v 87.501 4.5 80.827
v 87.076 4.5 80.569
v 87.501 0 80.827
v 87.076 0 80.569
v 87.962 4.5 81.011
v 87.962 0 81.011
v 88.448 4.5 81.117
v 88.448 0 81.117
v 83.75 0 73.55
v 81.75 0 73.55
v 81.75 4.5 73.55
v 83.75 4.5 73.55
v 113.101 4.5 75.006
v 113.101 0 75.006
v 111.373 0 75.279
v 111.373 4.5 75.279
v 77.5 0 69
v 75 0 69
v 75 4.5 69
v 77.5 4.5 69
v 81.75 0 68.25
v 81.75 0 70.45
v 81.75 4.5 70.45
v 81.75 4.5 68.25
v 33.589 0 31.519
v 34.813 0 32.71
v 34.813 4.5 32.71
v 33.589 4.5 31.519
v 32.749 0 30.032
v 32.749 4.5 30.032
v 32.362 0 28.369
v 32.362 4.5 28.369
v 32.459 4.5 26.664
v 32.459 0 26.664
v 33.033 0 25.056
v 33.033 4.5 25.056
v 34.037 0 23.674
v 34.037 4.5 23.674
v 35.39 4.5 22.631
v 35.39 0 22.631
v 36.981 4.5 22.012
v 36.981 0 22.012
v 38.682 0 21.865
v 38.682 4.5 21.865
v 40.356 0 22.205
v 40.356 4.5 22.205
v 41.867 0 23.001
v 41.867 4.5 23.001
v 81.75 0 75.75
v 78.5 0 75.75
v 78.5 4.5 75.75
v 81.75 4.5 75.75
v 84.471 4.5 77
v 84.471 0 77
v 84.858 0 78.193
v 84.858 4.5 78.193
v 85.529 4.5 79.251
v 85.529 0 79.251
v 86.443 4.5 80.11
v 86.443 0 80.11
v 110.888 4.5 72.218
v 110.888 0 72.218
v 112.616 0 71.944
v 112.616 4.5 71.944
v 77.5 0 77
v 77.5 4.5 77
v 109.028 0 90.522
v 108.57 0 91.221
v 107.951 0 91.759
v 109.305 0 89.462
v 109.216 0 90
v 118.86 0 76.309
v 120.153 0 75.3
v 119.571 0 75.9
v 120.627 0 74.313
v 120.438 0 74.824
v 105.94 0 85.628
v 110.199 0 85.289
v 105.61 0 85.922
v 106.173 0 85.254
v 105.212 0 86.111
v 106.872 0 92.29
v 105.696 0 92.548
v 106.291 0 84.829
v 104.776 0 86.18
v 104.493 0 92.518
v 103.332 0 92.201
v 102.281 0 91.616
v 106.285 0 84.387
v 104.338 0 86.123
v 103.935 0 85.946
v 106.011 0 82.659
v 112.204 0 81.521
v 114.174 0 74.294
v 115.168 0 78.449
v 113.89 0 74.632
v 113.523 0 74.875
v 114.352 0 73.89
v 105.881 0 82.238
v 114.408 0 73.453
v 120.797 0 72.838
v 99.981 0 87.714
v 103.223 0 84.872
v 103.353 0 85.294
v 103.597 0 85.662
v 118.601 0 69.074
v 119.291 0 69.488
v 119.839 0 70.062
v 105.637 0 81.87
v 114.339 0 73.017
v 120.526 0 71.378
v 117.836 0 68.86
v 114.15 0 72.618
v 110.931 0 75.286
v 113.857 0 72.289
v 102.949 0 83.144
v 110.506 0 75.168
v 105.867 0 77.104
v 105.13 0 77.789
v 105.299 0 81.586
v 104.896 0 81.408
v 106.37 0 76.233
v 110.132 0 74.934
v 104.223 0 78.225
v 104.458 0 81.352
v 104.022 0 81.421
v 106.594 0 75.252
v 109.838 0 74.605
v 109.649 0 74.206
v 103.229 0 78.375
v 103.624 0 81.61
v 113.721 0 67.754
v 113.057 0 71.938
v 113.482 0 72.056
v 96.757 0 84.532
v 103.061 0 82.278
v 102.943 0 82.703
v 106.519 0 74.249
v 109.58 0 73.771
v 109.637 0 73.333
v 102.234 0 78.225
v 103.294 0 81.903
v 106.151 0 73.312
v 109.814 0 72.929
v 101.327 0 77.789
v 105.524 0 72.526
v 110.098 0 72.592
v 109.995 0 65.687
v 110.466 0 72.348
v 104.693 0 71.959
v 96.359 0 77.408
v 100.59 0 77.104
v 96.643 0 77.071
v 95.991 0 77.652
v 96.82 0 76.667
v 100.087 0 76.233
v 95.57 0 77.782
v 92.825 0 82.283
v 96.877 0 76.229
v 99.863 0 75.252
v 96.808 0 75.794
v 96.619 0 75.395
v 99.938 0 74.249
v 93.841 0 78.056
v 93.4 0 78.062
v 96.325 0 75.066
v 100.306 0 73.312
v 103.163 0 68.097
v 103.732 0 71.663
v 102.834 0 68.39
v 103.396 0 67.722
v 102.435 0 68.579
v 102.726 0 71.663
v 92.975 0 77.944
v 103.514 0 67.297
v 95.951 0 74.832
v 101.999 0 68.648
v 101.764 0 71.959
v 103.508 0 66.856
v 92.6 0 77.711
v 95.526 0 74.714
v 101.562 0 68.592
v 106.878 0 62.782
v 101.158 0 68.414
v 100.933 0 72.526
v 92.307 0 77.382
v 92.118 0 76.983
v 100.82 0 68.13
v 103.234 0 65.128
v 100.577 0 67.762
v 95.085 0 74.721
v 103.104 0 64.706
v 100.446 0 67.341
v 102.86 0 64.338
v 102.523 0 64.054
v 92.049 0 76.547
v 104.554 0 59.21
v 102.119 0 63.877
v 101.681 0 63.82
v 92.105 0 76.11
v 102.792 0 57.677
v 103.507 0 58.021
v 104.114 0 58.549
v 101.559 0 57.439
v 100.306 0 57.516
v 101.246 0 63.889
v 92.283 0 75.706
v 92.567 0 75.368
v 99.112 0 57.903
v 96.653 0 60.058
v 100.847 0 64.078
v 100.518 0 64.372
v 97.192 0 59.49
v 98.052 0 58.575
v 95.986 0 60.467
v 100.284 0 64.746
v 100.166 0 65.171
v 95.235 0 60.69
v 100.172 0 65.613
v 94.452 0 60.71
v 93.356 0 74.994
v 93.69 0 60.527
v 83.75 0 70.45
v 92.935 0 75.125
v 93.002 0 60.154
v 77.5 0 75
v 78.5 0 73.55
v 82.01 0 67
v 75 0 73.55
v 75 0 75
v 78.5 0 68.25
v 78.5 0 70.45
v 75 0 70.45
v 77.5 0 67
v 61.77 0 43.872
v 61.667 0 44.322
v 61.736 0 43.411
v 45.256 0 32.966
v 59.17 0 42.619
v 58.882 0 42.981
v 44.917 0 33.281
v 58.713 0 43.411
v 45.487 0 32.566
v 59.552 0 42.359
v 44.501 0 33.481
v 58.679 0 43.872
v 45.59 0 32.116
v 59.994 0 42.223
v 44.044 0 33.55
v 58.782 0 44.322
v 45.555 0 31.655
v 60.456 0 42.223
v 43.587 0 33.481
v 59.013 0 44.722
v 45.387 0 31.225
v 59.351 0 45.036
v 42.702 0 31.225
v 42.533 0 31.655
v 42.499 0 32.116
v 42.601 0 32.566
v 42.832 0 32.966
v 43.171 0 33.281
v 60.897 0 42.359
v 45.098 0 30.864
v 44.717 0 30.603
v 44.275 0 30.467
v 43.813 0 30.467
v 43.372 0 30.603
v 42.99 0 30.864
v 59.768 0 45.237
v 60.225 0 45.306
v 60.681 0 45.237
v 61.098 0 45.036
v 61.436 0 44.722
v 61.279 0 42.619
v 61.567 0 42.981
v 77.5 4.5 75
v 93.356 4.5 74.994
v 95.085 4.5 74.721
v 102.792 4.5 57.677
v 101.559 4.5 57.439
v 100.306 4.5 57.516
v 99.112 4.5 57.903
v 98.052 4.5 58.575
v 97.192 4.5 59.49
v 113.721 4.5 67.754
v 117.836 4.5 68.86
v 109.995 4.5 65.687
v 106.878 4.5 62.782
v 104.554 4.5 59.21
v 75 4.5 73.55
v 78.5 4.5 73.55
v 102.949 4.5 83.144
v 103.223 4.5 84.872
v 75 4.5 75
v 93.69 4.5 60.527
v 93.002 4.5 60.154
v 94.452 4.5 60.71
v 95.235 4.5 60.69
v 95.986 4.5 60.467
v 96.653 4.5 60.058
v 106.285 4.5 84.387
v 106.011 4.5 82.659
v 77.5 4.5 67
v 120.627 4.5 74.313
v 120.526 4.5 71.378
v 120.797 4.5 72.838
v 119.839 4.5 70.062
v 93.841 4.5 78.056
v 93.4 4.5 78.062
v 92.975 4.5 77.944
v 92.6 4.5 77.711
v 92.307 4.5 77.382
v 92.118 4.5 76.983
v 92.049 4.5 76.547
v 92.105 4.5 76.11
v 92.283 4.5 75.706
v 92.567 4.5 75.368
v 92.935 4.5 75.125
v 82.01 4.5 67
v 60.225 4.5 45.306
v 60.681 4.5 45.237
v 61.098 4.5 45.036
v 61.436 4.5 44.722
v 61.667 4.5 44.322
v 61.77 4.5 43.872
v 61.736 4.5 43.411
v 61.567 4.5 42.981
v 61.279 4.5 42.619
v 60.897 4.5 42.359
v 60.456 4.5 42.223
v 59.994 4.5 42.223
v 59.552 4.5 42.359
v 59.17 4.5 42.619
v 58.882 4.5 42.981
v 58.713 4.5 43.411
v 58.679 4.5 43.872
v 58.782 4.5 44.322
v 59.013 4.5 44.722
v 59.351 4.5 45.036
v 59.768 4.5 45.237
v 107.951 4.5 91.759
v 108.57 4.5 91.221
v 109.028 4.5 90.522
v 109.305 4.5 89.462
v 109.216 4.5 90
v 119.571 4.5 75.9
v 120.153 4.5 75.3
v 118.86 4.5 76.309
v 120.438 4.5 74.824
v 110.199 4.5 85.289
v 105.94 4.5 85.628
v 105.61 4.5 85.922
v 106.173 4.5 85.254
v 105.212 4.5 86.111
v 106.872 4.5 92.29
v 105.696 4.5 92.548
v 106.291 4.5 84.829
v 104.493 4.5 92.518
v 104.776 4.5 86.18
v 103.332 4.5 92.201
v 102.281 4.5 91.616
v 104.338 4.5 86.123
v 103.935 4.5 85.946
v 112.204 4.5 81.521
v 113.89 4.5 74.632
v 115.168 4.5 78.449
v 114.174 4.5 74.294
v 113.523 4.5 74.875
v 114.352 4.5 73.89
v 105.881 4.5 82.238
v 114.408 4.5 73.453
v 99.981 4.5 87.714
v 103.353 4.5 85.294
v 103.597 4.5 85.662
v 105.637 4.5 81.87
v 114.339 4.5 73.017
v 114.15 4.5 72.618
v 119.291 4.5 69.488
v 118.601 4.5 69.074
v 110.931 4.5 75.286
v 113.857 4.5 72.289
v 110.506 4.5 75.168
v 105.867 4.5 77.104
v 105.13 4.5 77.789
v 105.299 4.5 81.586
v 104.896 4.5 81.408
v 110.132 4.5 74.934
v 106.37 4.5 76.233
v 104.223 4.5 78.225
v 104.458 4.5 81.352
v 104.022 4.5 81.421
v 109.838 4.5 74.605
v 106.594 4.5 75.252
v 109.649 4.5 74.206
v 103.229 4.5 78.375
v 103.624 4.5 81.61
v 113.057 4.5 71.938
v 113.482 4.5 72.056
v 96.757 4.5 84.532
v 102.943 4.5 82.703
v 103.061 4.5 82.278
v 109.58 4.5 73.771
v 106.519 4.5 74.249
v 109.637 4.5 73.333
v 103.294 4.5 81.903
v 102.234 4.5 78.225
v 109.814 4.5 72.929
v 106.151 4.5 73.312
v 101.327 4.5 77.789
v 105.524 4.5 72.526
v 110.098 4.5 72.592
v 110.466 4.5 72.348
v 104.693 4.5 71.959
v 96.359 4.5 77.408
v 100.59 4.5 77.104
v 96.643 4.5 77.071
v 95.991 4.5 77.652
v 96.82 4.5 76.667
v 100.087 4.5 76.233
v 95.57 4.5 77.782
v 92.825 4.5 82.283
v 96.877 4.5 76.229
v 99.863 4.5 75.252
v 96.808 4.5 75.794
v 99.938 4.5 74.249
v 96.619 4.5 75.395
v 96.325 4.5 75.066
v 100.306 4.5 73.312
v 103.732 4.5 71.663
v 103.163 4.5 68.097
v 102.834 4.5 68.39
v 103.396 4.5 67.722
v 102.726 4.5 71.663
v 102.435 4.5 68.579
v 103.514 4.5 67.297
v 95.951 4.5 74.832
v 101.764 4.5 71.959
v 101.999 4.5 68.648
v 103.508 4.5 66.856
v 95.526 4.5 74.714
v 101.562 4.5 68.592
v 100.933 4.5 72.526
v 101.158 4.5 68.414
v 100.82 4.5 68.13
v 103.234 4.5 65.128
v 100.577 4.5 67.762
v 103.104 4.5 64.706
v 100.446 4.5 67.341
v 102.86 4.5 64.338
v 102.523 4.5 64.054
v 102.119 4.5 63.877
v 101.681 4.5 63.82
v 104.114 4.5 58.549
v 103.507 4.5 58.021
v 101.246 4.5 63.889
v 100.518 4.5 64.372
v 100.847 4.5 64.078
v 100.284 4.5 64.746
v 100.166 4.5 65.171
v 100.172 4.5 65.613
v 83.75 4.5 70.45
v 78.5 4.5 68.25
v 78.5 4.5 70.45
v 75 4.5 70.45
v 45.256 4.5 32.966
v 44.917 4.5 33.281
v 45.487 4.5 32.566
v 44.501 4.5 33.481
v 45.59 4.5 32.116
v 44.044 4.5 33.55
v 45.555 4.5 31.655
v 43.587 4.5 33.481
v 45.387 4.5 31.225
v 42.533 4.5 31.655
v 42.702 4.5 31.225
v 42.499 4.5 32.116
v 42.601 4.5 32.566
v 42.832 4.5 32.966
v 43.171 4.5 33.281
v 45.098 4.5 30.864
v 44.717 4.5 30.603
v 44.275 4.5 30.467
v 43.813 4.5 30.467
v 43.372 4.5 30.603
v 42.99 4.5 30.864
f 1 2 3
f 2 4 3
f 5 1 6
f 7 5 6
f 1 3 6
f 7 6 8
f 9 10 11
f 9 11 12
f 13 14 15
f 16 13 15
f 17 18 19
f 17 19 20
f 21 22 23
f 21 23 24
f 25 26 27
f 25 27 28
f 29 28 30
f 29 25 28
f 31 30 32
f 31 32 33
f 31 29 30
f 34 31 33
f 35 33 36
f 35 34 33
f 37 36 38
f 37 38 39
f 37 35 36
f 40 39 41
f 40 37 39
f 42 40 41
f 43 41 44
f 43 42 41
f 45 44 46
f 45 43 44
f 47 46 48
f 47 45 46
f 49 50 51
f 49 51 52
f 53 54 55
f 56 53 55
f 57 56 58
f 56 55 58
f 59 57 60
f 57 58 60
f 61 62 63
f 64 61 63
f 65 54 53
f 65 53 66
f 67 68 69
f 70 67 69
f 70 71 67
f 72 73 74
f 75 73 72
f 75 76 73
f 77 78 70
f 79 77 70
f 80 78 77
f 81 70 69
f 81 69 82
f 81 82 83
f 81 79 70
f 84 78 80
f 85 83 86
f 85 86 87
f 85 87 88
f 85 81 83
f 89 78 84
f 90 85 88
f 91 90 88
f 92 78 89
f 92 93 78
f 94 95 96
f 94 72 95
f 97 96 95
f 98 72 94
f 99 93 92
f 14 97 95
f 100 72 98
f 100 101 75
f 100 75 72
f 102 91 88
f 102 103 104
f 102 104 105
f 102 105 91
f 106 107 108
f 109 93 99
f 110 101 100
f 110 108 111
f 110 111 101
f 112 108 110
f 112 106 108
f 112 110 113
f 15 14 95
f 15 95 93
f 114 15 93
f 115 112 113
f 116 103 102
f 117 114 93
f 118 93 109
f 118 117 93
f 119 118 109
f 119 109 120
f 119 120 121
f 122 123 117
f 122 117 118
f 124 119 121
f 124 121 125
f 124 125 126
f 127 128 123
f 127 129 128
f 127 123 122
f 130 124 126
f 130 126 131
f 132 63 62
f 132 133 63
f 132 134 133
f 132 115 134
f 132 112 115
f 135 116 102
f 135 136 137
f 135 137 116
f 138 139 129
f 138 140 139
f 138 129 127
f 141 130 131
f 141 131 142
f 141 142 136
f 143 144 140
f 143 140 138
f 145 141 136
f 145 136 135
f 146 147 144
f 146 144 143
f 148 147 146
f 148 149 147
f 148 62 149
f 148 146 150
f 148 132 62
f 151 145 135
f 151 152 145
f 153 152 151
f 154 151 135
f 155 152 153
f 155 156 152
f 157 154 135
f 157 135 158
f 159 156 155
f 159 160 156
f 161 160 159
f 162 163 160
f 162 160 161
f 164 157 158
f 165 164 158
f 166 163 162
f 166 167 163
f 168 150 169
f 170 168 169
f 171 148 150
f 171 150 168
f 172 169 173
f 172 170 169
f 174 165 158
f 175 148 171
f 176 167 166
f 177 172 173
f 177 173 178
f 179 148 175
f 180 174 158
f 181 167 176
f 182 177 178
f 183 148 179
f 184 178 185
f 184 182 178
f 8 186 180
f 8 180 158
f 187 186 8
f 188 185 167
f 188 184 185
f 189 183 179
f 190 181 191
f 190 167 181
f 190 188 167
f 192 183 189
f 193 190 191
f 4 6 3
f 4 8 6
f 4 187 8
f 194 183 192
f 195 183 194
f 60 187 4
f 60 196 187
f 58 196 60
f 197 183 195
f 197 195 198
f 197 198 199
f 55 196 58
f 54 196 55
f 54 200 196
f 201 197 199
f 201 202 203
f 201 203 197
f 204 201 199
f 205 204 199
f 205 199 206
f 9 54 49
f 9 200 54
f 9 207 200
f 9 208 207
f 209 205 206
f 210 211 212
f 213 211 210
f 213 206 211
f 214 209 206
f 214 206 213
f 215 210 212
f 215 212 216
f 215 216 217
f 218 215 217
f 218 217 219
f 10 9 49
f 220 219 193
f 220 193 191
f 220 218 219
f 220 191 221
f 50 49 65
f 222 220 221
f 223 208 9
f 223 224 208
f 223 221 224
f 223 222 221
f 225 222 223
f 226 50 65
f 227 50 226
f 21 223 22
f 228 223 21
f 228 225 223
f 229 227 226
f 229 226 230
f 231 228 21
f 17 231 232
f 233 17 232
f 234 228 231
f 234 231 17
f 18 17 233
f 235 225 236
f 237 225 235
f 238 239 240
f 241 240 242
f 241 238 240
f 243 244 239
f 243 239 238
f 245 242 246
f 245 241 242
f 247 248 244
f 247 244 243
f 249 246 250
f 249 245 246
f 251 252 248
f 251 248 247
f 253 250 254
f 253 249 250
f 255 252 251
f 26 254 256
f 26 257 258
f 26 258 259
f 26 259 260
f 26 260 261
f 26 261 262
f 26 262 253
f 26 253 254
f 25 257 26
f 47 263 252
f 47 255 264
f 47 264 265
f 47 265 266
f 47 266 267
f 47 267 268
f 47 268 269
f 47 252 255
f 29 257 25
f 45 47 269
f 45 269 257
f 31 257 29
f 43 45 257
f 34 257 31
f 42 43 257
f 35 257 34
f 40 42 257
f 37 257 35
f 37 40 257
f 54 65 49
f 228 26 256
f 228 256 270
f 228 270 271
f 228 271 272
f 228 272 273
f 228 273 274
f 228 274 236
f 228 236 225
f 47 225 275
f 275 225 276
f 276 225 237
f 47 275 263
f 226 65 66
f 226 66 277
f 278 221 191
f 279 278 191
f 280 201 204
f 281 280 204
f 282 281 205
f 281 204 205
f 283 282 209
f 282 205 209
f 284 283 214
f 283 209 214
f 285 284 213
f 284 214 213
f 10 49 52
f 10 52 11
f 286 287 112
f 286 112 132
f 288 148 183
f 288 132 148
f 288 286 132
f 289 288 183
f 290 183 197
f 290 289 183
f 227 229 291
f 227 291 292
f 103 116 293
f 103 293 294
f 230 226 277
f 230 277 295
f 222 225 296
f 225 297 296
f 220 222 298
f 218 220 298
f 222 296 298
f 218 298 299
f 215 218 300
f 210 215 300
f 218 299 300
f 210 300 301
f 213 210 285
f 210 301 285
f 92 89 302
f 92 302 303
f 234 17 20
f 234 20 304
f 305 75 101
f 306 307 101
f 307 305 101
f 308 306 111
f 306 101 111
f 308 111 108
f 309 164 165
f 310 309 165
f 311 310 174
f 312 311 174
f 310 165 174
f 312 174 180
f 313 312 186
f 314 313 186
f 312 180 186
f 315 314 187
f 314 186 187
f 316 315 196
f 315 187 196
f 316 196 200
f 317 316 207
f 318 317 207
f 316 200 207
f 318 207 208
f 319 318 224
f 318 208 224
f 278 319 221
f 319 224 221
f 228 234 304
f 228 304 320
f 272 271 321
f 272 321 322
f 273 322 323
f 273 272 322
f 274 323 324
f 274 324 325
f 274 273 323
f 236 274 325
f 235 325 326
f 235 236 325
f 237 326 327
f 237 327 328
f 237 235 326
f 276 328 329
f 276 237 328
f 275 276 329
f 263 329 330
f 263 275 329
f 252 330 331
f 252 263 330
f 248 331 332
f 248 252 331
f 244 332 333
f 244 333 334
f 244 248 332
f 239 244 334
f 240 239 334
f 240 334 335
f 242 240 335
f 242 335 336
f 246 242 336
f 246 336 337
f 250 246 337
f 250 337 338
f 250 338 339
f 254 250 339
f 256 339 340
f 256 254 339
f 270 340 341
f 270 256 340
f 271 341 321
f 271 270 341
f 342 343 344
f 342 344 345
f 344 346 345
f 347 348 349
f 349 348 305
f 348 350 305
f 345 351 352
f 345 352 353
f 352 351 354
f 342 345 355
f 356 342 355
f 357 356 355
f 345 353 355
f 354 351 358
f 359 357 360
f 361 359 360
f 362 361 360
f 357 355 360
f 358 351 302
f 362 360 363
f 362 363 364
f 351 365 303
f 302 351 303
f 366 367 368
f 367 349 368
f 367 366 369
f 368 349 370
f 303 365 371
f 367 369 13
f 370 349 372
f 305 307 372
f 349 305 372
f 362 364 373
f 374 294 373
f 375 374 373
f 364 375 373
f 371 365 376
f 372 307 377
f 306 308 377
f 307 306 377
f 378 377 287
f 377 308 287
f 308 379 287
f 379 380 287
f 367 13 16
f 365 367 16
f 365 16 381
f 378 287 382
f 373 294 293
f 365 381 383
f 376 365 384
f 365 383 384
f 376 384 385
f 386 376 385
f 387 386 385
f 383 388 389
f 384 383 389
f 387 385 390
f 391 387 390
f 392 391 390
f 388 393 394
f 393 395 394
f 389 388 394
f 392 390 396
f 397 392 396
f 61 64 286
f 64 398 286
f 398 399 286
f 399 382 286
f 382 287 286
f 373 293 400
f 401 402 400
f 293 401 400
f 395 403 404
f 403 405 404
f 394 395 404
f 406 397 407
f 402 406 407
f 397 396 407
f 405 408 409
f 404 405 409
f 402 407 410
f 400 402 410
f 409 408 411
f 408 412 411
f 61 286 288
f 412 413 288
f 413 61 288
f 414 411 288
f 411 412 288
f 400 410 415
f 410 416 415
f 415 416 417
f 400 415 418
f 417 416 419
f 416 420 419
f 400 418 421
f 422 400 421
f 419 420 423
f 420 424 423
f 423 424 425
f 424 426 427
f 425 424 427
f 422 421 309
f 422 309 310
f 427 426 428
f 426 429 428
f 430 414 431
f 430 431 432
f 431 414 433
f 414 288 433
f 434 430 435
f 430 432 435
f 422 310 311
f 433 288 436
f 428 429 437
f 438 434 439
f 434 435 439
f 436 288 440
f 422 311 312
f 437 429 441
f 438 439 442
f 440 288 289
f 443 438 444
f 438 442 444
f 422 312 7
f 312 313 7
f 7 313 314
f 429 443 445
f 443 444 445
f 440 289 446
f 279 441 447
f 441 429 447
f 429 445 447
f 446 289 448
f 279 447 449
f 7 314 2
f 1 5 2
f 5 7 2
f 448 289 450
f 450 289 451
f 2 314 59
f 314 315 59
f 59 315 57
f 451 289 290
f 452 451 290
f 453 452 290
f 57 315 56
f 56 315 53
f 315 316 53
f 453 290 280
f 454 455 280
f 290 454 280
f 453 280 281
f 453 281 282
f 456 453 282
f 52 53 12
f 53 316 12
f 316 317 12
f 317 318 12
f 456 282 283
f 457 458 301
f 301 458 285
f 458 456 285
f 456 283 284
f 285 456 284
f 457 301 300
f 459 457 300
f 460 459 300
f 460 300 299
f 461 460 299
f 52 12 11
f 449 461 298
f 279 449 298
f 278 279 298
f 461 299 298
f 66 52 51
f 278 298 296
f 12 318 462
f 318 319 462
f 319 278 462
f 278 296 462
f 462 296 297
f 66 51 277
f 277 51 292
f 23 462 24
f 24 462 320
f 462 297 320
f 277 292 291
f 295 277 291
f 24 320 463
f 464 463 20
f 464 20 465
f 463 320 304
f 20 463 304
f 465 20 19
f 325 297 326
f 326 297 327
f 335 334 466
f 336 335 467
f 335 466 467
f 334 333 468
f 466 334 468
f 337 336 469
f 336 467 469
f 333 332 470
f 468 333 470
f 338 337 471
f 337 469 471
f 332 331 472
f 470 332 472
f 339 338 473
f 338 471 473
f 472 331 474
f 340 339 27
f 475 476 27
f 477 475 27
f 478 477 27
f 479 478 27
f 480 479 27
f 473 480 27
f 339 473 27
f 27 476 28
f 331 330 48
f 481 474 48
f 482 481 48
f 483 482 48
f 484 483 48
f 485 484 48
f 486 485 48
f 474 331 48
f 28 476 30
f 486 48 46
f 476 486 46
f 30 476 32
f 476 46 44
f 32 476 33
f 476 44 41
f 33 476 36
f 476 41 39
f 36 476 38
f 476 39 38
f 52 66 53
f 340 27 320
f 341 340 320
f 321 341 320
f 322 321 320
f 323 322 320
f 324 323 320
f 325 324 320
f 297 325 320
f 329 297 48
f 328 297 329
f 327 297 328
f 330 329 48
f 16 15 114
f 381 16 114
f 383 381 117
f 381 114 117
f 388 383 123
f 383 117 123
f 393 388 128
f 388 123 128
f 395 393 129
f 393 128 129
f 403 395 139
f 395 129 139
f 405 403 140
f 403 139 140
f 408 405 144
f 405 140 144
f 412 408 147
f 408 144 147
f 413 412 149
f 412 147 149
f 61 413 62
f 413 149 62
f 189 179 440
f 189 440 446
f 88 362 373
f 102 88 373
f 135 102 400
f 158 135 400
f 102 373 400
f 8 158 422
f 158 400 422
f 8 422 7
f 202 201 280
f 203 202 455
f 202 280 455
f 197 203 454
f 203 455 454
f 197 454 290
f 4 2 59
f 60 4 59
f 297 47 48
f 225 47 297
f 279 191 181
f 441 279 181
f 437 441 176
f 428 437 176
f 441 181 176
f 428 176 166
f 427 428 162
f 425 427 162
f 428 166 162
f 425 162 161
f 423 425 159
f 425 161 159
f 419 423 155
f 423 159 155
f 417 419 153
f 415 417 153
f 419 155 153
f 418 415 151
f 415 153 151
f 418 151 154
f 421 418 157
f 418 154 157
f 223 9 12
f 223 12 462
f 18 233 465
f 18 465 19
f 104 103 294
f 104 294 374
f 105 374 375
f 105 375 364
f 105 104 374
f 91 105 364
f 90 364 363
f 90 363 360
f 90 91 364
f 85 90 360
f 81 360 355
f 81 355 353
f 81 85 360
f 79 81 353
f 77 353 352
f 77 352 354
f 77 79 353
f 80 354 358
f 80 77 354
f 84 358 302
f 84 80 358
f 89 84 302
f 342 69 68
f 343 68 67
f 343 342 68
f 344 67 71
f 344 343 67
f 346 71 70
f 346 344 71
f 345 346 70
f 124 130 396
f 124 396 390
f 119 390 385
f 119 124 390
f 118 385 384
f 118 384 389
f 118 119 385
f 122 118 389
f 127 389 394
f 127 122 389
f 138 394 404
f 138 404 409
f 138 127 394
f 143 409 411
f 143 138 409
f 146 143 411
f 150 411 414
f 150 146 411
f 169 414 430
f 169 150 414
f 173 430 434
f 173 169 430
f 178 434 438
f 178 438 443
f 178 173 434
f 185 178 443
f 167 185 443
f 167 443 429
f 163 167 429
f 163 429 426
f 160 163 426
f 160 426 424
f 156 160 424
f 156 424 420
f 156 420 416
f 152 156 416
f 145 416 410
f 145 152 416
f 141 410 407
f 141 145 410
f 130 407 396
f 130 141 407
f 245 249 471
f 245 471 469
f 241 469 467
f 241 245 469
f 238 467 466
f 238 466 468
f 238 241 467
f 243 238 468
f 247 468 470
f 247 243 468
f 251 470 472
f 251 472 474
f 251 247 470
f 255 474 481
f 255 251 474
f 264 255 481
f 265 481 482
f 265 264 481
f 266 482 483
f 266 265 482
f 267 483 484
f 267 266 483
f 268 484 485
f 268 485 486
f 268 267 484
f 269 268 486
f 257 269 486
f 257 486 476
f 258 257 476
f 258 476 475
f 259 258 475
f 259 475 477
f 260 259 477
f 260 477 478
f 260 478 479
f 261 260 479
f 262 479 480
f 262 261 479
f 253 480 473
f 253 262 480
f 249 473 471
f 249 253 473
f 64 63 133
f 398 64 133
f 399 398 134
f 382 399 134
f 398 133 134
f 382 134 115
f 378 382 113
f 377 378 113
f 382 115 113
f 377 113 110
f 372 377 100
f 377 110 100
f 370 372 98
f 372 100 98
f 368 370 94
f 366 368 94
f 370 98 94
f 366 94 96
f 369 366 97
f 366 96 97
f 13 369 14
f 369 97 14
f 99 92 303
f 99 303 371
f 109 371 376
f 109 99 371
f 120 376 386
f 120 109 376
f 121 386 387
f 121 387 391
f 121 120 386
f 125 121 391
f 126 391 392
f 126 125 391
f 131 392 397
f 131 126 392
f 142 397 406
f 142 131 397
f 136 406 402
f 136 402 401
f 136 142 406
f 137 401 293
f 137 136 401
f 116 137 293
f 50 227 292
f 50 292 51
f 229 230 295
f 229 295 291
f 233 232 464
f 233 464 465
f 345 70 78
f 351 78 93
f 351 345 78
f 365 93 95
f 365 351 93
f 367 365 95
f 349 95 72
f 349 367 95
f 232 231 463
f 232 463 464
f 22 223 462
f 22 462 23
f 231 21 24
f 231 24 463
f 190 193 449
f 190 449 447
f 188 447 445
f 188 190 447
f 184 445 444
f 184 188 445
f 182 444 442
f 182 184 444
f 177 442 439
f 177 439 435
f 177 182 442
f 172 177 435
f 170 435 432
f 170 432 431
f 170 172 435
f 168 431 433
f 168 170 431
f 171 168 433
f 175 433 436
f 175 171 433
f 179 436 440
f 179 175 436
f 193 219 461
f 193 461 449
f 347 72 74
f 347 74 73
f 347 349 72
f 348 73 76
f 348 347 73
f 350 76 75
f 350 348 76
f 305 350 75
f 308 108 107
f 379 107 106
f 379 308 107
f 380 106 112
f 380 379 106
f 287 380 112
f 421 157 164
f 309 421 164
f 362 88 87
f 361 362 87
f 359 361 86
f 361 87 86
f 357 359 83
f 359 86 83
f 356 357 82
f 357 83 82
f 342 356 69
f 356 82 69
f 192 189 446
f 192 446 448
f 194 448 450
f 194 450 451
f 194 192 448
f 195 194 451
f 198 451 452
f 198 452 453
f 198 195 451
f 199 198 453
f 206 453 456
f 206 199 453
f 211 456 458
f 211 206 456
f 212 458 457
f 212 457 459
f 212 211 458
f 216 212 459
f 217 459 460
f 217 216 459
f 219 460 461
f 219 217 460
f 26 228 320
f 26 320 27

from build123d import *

# Parameters (mm, degrees)
SKETCH_3_R          = 3.375
SKETCH_3_R_2        = 1.55
EXTRUDE_1_DEPTH     = 4.5
FILLET_1_R          = 5
CUT_EXTRUDE_2_REACH = 154.257
FILLET_3_R          = 3


# Some blends are built 0.0001 mm under size
with BuildPart() as part:
    # 草图3 → 凸台-拉伸1 (new body)
    with BuildSketch(Plane(origin=(0, 0, 0), x_dir=(1, 0, 0), z_dir=(0, 1, 0))):
        with BuildLine():
            Line((41.866639538, -23.001486264), (95.429117628, -61.916904502))
            Line((95.429117628, -61.916904502), (100.131399646, -55.444768547))
            Line((100.131399646, -55.444768547), (122.783875489, -71.902755611))
            Line((122.783875489, -71.902755611), (106.325888424, -94.555231453))
            Line((106.325888424, -94.555231453), (83.673412582, -78.097244389))
            Line((83.673412582, -78.097244389), (84.470607294, -77))
            Line((84.470607294, -77), (82.009778971, -77))
            Line((82.009778971, -77), (77.5, -77))
            Line((77.5, -77), (77.5, -75))
            Line((77.5, -75), (75, -75))
            Line((75, -75), (75, -73.55))
            Line((75, -73.55), (78.5, -73.55))
            Line((78.5, -73.55), (78.5, -75.75))
            Line((78.5, -75.75), (81.75, -75.75))
            Line((81.75, -75.75), (81.75, -73.55))
            Line((81.75, -73.55), (83.75, -73.55))
            Line((83.75, -73.55), (83.75, -70.45))
            Line((83.75, -70.45), (81.75, -70.45))
            Line((81.75, -70.45), (81.75, -68.25))
            Line((81.75, -68.25), (78.5, -68.25))
            Line((78.5, -68.25), (78.5, -70.45))
            Line((78.5, -70.45), (75, -70.45))
            Line((75, -70.45), (75, -69))
            Line((75, -69), (77.5, -69))
            Line((77.5, -69), (77.5, -67))
            Line((77.5, -67), (82.009778971, -67))
            Line((82.009778971, -67), (34.81321651, -32.709690196))
            ThreePointArc((34.81321651, -32.709690196), (33.485826058, -24.328876716), (41.866639538, -23.001486264))
        make_face()
        with Locations(Location((103.228644035, -75, 0), (0, 0, 270))):
            Circle(SKETCH_3_R, mode=Mode.SUBTRACT)
        with Locations(Location((44.044221455, -32, 0), (0, 0, 270))):
            Circle(SKETCH_3_R_2, mode=Mode.SUBTRACT)
        with Locations(Location((60.224561343, -43.755705046, 0), (0, 0, 270))):
            Circle(SKETCH_3_R_2, mode=Mode.SUBTRACT)
        with BuildLine():
            Line((110.887677339, -72.217607352), (112.616131935, -71.943847038))
            ThreePointArc((112.616131935, -71.943847038), (114.389522284, -73.232290545), (113.101078777, -75.005680894))
            Line((113.101078777, -75.005680894), (111.372624181, -75.279441208))
            ThreePointArc((111.372624181, -75.279441208), (109.599233832, -73.9909977), (110.887677339, -72.217607352))
        make_face(mode=Mode.SUBTRACT)
        with BuildLine():
            Line((103.508085243, -66.856019854), (103.234324929, -65.127565258))
            ThreePointArc((103.234324929, -65.127565258), (101.46093458, -63.839121751), (100.172491073, -65.6125121))
            Line((100.172491073, -65.6125121), (100.446251387, -67.340966696))
            ThreePointArc((100.446251387, -67.340966696), (102.219641736, -68.629410203), (103.508085243, -66.856019854))
        make_face(mode=Mode.SUBTRACT)
        with BuildLine():
            Line((95.569610731, -77.782392648), (93.841156135, -78.056152962))
            ThreePointArc((93.841156135, -78.056152962), (92.067765787, -76.767709455), (93.356209294, -74.994319106))
            Line((93.356209294, -74.994319106), (95.08466389, -74.720558792))
            ThreePointArc((95.08466389, -74.720558792), (96.858054238, -76.0090023), (95.569610731, -77.782392648))
        make_face(mode=Mode.SUBTRACT)
        with BuildLine():
            Line((102.949202828, -83.143980146), (103.222963142, -84.872434742))
            ThreePointArc((103.222963142, -84.872434742), (104.99635349, -86.160878249), (106.284796997, -84.3874879))
            Line((106.284796997, -84.3874879), (106.011036684, -82.659033304))
            ThreePointArc((106.011036684, -82.659033304), (104.237646335, -81.370589797), (102.949202828, -83.143980146))
        make_face(mode=Mode.SUBTRACT)
    extrude(amount=EXTRUDE_1_DEPTH)

    # 圆角-美观1
    # the kernel refuses this fillet: 5 mm, written as the material it takes off along each edge
    with BuildSketch(Plane(origin=(83.673412582, -8.559797701, 78.097244389), x_dir=(0.5877852522924398, 0, -0.8090169943749717), z_dir=(0, 1, 0))) as fillet_1_piece_1:
        with BuildLine():
            CenterArc((5, -3.423919081), FILLET_1_R, 136.781392116, 43.218607884)
            Line((0, -3.423919081), (-0.1, -3.423919081))
            Line((-0.1, -3.423919081), (-0.1, 0))
            Line((-0.1, 0), (0, 0.1))
            ThreePointArc((0, 0.1), (0.678134326, 0.1), (1.283394026, 0.068478382))
            Line((1.283394026, 0.068478382), (1.356268653, 0))
        make_face()
    extrude(amount=21.619595403, mode=Mode.SUBTRACT)
    with BuildSketch(Plane(origin=(100.131399646, -12.5, 55.444768547), x_dir=(0.8090169943749468, 0, 0.5877852522924739), z_dir=(0, 1, 0)), Plane(origin=(122.783875489, -12.5, 71.902755611), x_dir=(-0.5877852522924745, 0, 0.8090169943749465), z_dir=(0, 1, 0)), Plane(origin=(106.325888424, -12.5, 94.555231453), x_dir=(-0.8090169943749468, 0, -0.5877852522924739), z_dir=(0, 1, 0))) as fillet_1_piece_2:
        with BuildLine():
            CenterArc((FILLET_1_R, -FILLET_1_R), FILLET_1_R, 90, 90)
            Line((0, -FILLET_1_R), (-FILLET_1_R * 0.02, -FILLET_1_R))
            Line((-FILLET_1_R * 0.02, -FILLET_1_R), (-FILLET_1_R * 0.02, FILLET_1_R * 0.02))
            Line((-FILLET_1_R * 0.02, FILLET_1_R * 0.02), (FILLET_1_R, FILLET_1_R * 0.02))
            Line((FILLET_1_R, FILLET_1_R * 0.02), (FILLET_1_R, 0))
        make_face()
    extrude(amount=29.5, mode=Mode.SUBTRACT)

    # 草图4 → 圆弧-美观2 (cut, up to next)
    with BuildSketch(Plane(origin=(0, 4.5, 0), x_dir=(1, 0, 0), z_dir=(0, 1, 0)), mode=Mode.PRIVATE) as cut_extrude_2_sk1:
        with BuildLine():
            Line((104.176484618, -58.383694808), (118.738790517, -68.963829349))
            ThreePointArc((118.738790517, -68.963829349), (109.994899962, -65.687047674), (104.176484618, -58.383694808))
        make_face()
    cut_extrude_2_tool1 = extrude(cut_extrude_2_sk1.sketch, amount=-CUT_EXTRUDE_2_REACH, mode=Mode.PRIVATE) & part.part
    # 草图4 → 圆弧-美观2 (cut, up to next)
    with BuildSketch(Plane(origin=(0, 4.5, 0), x_dir=(1, 0, 0), z_dir=(0, 1, 0)), mode=Mode.PRIVATE) as cut_extrude_2_sk2:
        with BuildLine():
            Line((119.844949227, -75.947840583), (109.264814686, -90.510146481))
            ThreePointArc((109.264814686, -90.510146481), (112.204348353, -81.521230905), (119.844949227, -75.947840583))
        make_face()
    cut_extrude_2_tool2 = extrude(cut_extrude_2_sk2.sketch, amount=-CUT_EXTRUDE_2_REACH, mode=Mode.PRIVATE) & part.part
    # 草图4 → 圆弧-美观2 (cut, up to next)
    with BuildSketch(Plane(origin=(0, 4.5, 0), x_dir=(1, 0, 0), z_dir=(0, 1, 0)), mode=Mode.PRIVATE) as cut_extrude_2_sk3:
        with BuildLine():
            Line((87.718497554, -81.036170651), (102.280803453, -91.616305192))
            ThreePointArc((102.280803453, -91.616305192), (96.462388109, -84.312952326), (87.718497554, -81.036170651))
        make_face()
    cut_extrude_2_tool3 = extrude(cut_extrude_2_sk3.sketch, amount=-CUT_EXTRUDE_2_REACH, mode=Mode.PRIVATE) & part.part
    add(cut_extrude_2_tool1.solids().sort_by_distance((110.868828, 4.5, 64.48419))[0], mode=Mode.SUBTRACT)
    add(cut_extrude_2_tool2.solids().sort_by_distance((113.606622, 4.5, 82.540042))[0], mode=Mode.SUBTRACT)
    add(cut_extrude_2_tool3.solids().sort_by_distance((95.58846, 4.5, 85.51581))[0], mode=Mode.SUBTRACT)

    # 圆角-美观3
    fillet_3_edges = [part.edges().sort_by_distance(p)[0] for p in [
        (104.176484618, 2.25, 58.383694808),
        (118.738790517, 2.25, 68.963829349),
        (119.844949227, 2.25, 75.947840583),
        (109.264814686, 2.25, 90.510146481),
        (95.429117628, 2.25, 61.916904502),
        (87.718497554, 2.25, 81.036170651),
    ]]
    fillet(fillet_3_edges, radius=FILLET_3_R - 0.0001)  # a hair under: the kernel refuses the full size


solid = part.part
